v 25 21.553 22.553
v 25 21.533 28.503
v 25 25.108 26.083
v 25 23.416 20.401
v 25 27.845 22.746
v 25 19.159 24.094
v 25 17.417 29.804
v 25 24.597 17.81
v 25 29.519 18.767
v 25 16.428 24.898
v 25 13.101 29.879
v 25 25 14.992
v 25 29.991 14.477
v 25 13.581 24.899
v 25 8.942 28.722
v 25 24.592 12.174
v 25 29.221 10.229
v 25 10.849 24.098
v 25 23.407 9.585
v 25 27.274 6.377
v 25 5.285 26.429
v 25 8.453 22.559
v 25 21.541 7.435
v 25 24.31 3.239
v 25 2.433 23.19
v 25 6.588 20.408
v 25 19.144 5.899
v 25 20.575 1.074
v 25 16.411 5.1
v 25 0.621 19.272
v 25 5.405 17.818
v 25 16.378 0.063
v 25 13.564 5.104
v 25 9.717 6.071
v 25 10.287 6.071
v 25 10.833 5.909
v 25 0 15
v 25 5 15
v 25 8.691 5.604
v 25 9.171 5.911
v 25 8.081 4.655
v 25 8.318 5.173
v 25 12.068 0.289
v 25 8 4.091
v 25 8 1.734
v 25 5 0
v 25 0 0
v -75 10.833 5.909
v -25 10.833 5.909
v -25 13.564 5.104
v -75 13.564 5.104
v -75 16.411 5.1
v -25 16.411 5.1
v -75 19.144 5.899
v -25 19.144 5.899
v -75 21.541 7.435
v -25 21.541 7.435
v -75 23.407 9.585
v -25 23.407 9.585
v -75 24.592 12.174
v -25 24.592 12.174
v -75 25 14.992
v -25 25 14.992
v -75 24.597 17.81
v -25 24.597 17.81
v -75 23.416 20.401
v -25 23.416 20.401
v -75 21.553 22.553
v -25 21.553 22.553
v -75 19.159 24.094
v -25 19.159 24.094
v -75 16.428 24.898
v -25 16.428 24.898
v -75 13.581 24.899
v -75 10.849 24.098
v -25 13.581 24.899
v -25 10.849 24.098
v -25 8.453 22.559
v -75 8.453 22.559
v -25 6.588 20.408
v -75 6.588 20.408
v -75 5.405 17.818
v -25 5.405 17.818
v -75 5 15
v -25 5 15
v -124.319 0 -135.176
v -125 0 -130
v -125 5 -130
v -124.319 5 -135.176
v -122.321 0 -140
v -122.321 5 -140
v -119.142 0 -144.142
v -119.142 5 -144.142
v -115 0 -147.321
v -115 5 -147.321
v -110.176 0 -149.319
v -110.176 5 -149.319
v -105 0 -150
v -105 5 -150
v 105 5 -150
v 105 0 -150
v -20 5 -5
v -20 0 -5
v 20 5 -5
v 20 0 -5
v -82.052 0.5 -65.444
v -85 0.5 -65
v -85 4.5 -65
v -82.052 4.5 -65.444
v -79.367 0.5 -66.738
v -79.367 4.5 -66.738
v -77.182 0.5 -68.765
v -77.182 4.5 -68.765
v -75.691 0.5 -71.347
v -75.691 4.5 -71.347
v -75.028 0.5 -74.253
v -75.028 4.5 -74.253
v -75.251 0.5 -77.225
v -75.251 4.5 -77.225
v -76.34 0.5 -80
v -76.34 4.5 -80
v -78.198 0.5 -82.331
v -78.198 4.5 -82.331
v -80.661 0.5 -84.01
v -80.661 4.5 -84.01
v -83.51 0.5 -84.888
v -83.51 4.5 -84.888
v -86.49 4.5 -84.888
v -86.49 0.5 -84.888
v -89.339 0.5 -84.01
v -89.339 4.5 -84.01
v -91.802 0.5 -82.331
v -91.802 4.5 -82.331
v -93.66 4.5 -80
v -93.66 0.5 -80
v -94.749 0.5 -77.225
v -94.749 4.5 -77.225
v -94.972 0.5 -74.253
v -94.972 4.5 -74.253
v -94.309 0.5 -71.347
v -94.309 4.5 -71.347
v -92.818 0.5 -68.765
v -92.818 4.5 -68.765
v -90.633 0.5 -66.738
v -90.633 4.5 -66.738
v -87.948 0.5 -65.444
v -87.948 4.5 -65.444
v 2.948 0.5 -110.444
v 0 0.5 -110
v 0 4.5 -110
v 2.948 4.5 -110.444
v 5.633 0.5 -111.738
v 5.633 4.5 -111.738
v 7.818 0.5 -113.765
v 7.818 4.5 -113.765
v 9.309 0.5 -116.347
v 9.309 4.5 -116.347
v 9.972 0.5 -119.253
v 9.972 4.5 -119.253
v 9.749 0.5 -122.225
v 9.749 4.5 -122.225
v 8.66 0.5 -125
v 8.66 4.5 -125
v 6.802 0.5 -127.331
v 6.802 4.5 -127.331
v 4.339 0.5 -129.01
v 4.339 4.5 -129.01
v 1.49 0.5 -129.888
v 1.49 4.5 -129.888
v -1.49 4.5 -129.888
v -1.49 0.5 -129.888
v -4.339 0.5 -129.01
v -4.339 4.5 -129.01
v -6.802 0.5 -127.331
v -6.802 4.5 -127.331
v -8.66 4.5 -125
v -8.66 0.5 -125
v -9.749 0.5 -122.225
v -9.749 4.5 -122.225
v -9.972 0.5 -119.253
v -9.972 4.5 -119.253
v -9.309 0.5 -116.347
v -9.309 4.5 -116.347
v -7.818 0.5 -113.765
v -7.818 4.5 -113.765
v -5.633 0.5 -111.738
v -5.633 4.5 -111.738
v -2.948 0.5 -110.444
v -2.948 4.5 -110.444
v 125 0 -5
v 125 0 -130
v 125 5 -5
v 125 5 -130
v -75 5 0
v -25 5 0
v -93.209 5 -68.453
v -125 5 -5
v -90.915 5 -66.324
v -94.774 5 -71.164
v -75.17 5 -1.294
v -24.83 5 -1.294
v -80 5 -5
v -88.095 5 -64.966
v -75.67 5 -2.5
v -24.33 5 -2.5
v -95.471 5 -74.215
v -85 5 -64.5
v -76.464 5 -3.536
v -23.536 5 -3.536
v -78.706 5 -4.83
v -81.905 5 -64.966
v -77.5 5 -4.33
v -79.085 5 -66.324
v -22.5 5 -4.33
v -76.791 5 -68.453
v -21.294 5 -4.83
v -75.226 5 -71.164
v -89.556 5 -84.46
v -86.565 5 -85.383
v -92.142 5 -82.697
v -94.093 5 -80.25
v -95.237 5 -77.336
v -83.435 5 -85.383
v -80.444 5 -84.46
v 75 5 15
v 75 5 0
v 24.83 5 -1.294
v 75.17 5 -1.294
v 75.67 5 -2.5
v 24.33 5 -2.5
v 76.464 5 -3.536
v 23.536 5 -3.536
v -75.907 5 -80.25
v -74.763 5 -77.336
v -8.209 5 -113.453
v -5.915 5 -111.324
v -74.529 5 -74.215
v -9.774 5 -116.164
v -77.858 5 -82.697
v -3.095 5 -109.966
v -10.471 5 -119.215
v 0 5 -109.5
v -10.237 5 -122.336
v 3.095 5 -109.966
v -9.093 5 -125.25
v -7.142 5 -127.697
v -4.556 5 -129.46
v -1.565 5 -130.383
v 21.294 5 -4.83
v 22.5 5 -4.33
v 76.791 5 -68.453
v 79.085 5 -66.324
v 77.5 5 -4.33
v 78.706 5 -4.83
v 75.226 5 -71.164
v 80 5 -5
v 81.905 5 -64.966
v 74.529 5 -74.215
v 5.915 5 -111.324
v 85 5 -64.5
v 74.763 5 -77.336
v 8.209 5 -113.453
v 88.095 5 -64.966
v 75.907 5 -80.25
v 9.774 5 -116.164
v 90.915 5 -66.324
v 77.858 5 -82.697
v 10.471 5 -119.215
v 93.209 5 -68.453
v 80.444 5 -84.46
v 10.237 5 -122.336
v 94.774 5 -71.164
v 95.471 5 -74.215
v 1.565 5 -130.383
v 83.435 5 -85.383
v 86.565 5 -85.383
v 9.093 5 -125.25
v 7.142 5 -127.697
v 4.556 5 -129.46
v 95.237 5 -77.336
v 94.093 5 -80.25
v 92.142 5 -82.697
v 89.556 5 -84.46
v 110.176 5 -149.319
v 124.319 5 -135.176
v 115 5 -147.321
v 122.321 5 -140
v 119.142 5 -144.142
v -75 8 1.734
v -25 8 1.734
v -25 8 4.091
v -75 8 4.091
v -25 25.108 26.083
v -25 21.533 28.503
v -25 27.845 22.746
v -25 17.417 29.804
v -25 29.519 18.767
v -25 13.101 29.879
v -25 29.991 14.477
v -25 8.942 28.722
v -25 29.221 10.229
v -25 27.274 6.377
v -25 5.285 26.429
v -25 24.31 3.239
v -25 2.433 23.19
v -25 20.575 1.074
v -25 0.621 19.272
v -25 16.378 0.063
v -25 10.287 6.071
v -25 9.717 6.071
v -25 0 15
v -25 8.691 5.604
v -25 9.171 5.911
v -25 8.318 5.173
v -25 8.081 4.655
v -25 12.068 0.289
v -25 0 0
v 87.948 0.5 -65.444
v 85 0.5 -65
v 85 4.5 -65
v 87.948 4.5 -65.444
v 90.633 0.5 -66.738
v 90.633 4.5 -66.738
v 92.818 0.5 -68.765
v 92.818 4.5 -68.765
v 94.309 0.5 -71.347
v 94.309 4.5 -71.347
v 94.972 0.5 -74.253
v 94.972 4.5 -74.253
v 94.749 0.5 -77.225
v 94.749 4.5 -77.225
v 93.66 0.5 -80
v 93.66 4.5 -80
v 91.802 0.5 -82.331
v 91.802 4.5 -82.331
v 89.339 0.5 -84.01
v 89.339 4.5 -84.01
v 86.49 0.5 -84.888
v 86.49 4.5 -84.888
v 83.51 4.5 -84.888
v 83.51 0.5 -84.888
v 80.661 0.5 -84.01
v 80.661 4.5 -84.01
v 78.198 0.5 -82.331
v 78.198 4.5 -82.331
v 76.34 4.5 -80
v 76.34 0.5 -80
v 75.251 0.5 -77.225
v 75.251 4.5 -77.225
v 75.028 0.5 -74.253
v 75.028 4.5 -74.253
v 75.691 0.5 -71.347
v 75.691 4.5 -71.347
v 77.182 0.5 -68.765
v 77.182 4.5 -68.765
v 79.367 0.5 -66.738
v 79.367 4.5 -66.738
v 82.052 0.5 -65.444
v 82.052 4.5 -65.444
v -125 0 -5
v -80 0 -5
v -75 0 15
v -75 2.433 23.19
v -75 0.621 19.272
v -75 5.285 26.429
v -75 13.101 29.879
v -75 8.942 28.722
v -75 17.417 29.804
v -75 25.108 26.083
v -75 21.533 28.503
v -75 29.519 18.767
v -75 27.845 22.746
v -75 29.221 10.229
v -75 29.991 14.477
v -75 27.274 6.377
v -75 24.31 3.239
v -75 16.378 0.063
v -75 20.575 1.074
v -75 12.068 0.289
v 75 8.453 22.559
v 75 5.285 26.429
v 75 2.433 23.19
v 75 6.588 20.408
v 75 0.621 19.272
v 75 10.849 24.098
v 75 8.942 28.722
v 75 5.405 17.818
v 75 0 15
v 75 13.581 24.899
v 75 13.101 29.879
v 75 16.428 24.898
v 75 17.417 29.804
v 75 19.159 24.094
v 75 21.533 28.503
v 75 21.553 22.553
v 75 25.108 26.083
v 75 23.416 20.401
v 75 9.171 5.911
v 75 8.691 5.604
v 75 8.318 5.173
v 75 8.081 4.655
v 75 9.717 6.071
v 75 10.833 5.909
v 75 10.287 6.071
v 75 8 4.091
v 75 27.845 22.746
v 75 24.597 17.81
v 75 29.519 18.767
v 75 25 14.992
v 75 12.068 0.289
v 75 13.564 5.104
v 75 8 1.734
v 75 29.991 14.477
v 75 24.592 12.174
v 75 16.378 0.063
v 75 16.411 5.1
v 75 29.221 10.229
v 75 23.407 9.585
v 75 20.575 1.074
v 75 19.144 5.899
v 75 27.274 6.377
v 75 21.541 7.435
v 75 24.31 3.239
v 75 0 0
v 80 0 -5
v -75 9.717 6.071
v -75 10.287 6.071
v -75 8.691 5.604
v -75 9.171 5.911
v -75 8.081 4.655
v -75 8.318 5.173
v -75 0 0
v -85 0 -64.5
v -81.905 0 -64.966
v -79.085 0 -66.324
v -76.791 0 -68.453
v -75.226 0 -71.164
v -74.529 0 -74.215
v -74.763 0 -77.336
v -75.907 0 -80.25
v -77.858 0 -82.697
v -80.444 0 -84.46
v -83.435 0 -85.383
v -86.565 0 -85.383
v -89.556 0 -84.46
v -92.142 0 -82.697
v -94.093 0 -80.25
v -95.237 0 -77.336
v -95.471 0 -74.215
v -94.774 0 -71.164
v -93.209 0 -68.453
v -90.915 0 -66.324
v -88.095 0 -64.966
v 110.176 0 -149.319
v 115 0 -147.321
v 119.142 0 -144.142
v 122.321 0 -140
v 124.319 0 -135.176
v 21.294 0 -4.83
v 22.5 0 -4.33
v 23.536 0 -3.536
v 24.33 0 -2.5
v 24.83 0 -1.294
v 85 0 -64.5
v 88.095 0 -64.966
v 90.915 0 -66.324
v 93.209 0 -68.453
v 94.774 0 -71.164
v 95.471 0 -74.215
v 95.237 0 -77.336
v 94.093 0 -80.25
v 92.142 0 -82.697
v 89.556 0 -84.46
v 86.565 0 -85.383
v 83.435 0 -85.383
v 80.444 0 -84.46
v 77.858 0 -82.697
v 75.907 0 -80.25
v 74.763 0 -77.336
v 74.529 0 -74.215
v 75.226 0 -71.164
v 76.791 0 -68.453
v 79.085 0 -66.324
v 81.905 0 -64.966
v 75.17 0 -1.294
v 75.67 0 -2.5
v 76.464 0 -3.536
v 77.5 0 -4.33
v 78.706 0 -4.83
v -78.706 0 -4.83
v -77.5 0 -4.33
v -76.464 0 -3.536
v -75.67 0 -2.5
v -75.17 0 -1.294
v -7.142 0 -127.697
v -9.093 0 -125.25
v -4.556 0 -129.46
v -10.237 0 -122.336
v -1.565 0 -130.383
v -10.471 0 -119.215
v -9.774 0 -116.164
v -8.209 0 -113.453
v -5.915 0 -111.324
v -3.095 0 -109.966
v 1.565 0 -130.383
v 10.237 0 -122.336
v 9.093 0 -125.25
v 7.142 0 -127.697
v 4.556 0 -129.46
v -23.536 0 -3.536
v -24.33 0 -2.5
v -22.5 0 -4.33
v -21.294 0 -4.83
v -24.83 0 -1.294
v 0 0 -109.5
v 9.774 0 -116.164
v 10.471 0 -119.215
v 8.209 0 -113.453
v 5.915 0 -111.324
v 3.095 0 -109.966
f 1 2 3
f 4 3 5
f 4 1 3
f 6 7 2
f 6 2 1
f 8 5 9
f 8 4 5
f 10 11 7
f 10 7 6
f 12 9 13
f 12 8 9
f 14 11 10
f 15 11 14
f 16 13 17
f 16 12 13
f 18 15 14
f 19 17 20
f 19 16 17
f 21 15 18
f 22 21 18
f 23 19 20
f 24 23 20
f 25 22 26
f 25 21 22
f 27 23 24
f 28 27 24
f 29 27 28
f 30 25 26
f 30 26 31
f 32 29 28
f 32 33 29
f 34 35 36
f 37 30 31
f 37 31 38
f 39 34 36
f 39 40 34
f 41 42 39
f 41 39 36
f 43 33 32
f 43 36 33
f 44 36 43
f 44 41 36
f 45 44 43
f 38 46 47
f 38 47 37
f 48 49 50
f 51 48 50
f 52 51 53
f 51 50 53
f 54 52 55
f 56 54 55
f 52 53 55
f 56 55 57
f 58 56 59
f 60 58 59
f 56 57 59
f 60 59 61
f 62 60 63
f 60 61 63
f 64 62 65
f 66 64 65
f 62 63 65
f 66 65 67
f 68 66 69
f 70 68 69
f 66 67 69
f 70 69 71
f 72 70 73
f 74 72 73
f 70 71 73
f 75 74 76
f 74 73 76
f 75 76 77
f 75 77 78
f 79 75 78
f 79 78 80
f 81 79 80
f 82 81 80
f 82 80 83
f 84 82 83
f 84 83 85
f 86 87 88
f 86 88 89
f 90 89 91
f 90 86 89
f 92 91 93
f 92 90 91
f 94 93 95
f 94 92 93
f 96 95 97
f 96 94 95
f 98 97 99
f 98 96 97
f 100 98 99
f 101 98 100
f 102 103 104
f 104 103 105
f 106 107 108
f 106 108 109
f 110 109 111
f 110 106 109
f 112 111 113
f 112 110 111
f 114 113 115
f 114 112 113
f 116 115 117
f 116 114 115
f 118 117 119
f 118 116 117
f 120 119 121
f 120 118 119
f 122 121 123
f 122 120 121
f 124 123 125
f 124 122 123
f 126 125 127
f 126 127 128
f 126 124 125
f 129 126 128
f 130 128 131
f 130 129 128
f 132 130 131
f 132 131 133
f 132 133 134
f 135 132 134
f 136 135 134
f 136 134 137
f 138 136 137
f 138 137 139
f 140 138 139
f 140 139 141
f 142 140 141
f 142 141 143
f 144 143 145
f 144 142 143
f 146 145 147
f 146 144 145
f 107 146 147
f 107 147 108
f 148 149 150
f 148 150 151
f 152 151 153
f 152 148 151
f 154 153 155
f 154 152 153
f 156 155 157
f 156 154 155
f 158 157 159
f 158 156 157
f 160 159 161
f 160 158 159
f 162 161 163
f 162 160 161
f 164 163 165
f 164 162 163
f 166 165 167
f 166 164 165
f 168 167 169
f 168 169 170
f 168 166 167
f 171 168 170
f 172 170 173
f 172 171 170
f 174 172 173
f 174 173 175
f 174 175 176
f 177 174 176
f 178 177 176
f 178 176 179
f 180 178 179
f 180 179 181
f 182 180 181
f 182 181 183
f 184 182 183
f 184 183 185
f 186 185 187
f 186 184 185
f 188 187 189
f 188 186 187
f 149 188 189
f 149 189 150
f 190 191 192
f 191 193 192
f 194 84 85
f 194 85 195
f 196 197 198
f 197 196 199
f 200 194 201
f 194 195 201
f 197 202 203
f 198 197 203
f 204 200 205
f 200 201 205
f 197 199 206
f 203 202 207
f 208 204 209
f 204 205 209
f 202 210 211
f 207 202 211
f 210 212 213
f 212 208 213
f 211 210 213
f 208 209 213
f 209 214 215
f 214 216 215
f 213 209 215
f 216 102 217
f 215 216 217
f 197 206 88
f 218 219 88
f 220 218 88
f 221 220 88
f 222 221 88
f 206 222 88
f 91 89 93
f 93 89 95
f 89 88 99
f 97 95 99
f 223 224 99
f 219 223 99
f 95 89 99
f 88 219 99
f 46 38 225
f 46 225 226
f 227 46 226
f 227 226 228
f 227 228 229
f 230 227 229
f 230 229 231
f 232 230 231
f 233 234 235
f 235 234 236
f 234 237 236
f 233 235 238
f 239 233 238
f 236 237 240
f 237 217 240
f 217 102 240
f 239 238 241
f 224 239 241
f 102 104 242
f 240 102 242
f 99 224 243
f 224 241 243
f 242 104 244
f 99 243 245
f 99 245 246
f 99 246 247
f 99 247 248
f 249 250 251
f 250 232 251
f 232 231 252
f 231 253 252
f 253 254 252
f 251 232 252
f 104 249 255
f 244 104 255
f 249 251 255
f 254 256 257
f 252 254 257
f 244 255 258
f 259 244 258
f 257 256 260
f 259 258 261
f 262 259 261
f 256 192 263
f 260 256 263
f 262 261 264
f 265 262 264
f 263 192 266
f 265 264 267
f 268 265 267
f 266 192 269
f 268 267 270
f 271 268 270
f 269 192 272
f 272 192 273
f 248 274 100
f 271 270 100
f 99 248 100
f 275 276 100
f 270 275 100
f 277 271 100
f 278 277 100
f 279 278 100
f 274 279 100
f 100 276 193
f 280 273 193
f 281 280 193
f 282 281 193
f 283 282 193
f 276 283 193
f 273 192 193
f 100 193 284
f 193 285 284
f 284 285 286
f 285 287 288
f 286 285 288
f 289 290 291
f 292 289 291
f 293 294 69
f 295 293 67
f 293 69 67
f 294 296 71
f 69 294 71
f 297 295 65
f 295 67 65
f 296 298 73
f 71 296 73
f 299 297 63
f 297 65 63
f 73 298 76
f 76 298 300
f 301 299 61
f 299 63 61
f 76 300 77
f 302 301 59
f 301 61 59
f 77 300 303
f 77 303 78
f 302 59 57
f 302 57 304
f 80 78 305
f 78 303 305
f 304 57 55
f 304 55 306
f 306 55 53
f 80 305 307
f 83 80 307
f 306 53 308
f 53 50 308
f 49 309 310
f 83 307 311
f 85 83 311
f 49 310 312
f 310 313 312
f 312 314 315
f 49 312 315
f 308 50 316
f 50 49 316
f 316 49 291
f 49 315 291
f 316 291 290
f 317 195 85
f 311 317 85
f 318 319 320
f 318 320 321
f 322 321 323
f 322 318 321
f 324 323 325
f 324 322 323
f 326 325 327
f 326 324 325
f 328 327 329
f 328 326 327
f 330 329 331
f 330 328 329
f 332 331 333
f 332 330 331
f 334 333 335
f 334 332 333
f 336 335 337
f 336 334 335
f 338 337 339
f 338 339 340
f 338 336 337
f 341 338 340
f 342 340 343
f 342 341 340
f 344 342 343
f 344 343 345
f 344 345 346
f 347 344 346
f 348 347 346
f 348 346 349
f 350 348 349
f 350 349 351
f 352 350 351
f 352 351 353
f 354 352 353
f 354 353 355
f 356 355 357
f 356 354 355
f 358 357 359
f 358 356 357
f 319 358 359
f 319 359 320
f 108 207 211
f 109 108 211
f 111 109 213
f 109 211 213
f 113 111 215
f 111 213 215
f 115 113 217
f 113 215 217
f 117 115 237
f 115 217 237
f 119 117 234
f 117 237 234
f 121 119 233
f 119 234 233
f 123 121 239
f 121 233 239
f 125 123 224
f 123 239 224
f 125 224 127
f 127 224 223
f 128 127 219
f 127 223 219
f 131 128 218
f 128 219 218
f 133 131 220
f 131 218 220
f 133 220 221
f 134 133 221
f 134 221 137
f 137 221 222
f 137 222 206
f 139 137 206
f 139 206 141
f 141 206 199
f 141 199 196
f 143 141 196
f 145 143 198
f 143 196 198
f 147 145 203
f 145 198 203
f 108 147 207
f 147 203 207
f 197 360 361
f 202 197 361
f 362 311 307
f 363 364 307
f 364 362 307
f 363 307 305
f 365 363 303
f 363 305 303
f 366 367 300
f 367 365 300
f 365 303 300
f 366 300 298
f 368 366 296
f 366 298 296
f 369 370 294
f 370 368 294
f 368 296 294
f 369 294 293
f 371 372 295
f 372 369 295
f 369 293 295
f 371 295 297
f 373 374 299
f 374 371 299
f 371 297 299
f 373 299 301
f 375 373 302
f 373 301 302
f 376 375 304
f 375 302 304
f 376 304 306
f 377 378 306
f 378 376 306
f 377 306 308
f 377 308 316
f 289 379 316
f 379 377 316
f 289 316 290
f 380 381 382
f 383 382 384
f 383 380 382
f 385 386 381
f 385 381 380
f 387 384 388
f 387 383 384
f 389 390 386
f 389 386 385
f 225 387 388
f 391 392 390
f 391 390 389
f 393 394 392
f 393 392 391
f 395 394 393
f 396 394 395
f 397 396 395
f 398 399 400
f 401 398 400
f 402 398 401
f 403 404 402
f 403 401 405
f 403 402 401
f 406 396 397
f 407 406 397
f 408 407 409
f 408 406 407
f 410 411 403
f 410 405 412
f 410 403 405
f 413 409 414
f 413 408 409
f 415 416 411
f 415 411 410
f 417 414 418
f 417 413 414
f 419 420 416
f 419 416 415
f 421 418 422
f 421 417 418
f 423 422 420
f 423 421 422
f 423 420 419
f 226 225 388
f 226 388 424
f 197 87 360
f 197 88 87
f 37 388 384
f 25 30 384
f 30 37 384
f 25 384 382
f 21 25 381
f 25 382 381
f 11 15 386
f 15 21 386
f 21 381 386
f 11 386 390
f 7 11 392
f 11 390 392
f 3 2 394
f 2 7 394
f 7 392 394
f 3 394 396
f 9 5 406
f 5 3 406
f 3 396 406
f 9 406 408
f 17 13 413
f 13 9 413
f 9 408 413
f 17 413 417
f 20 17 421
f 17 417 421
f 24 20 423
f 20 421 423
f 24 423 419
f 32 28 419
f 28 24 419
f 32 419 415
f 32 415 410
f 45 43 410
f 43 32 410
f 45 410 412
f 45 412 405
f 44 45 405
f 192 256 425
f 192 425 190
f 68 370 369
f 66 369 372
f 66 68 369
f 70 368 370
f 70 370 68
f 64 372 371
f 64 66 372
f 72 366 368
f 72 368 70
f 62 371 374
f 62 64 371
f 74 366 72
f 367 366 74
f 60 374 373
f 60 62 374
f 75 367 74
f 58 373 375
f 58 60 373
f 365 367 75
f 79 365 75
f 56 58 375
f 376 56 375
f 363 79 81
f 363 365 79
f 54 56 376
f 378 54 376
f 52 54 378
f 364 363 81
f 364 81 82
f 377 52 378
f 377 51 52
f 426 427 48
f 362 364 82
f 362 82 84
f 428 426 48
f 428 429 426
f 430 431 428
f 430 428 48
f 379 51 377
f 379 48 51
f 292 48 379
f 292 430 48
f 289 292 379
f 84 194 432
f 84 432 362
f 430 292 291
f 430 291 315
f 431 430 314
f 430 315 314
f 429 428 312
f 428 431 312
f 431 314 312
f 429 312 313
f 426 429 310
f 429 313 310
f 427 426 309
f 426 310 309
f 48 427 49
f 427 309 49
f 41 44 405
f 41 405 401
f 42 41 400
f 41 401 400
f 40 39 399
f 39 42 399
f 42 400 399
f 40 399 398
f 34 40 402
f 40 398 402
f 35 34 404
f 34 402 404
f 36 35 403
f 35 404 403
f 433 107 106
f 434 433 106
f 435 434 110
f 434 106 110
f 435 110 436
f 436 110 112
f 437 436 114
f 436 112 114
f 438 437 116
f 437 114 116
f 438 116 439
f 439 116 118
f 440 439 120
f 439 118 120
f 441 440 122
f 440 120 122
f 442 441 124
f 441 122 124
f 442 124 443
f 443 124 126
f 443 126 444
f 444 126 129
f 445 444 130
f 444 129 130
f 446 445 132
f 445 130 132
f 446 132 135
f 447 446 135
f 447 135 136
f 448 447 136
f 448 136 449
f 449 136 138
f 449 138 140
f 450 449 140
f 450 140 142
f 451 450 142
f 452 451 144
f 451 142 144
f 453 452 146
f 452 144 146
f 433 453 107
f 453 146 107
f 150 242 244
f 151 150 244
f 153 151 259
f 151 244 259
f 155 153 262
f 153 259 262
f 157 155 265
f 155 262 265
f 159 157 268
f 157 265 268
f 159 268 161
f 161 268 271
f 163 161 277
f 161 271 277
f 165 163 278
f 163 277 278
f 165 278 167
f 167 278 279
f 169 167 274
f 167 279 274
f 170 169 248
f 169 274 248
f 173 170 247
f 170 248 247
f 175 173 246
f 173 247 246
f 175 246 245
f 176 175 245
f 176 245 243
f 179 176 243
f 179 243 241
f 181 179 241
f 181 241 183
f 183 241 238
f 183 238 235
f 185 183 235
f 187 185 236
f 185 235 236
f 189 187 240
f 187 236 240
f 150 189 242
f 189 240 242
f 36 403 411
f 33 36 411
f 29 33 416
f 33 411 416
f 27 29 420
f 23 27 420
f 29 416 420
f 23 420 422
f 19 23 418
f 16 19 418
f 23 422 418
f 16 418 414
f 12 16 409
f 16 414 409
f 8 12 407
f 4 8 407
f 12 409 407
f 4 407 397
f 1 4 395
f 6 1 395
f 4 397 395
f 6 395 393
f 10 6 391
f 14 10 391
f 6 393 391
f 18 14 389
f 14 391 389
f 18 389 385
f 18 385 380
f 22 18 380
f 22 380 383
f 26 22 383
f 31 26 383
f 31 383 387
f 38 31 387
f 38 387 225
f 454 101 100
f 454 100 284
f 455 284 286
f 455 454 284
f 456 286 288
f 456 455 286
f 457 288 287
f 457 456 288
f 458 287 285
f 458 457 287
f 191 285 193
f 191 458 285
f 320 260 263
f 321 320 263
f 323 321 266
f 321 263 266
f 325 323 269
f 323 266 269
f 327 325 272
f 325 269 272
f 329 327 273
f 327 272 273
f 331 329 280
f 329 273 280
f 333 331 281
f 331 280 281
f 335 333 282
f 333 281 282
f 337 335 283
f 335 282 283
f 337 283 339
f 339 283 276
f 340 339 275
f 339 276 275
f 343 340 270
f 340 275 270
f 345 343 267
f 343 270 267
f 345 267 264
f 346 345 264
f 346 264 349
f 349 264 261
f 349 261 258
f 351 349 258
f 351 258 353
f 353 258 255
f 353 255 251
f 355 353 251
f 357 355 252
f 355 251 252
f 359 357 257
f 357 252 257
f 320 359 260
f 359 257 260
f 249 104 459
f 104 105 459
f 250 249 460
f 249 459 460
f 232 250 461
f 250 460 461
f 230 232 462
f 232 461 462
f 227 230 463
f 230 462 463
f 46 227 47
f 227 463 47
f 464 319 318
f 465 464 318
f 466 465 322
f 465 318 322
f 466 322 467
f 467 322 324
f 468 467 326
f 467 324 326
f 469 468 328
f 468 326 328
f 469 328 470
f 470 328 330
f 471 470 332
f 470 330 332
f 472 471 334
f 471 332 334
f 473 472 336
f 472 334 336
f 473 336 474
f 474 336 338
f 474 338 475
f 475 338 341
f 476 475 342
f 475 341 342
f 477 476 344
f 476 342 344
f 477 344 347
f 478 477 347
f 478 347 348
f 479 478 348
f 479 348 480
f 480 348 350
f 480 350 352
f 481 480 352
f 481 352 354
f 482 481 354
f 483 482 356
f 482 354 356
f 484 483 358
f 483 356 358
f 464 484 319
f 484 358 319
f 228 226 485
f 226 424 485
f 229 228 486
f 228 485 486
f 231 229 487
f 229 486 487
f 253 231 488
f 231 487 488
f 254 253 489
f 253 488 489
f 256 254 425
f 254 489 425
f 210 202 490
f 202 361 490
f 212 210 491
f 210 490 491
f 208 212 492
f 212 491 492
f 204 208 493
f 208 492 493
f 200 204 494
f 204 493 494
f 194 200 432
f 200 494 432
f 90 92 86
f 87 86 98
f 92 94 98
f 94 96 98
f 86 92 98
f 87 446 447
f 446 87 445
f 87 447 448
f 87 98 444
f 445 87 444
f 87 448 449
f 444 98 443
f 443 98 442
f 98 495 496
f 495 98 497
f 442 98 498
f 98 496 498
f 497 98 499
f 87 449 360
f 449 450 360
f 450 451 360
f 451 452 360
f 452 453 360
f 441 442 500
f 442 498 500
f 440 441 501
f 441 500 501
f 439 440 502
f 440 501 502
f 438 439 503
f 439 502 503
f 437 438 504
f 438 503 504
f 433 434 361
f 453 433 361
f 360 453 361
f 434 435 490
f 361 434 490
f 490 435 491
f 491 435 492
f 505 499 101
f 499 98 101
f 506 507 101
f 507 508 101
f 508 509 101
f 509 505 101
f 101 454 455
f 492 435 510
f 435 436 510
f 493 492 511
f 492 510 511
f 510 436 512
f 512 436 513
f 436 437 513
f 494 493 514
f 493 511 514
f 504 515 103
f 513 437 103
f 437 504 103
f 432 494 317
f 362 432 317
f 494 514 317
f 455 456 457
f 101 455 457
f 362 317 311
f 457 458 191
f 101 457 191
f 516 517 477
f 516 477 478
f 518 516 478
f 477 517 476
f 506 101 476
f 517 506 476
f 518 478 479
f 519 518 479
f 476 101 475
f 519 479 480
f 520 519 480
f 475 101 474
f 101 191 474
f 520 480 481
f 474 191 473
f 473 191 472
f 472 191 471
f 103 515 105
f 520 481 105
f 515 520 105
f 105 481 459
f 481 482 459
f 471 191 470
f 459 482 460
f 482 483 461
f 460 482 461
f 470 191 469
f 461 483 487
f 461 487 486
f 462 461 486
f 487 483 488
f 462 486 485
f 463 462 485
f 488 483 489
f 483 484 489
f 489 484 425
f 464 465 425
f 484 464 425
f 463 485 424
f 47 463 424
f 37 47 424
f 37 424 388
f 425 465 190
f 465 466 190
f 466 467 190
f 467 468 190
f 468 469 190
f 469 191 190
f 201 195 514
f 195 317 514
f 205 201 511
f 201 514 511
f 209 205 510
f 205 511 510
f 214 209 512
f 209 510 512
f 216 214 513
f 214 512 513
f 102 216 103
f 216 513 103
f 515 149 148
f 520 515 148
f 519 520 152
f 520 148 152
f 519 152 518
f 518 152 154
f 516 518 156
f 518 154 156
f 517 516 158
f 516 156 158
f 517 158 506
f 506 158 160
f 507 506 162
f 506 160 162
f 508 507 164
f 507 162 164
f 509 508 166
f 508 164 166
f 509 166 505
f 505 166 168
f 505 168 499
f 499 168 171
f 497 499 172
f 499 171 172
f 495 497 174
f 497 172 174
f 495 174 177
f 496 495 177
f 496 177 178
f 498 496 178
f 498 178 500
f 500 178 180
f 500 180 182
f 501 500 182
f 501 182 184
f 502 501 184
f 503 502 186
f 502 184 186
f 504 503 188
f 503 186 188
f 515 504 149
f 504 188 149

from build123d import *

# Parameters (mm, degrees)
SKETCH1_R           = 10
BOSS_EXTRUDE1_DEPTH = 5
BOSS_EXTRUDE2_DEPTH = 125
SKETCH3_W           = 50
SKETCH3_H           = 35
CUT_EXTRUDE1_DEPTH  = 30
FILLET1_R           = 5
CHAMFER1_SIZE       = 0.5


with BuildPart() as part:
    # Sketch1 → Boss-Extrude1 (new body)
    with BuildSketch(Plane(origin=(0, 0, 0), x_dir=(1, 0, 0), z_dir=(0, 1, 0))):
        with BuildLine():
            Line((-105, 150), (105, 150))
            ThreePointArc((105, 150), (119.142135624, 144.142135624), (125, 130))
            Line((125, 130), (125, 0))
            Line((125, 0), (-125, 0))
            Line((-125, 0), (-125, 130))
            ThreePointArc((-125, 130), (-119.142135624, 144.142135624), (-105, 150))
        make_face()
        with Locations(Location((-85, 75, 0), (0, 0, 270))):
            Circle(SKETCH1_R, mode=Mode.SUBTRACT)
        with Locations(Location((85, 75, 0), (0, 0, 270))):
            Circle(SKETCH1_R, mode=Mode.SUBTRACT)
        with Locations(Location((0, 120, 0), (0, 0, 270))):
            Circle(SKETCH1_R, mode=Mode.SUBTRACT)
    extrude(amount=BOSS_EXTRUDE1_DEPTH)

    # Sketch2 → Boss-Extrude2 (add, symmetric)
    with BuildSketch(Plane(origin=(0, 0, 0), x_dir=(0, 0, -1), z_dir=(1, 0, 0))):
        with BuildLine():
            Line((0, 0), (-15, 0))
            ThreePointArc((-15, 0), (-22.745966692, 27.845232579), (-1.733500839, 8))
            Line((-1.733500839, 8), (-4.091287885, 8))
            ThreePointArc((-4.091287885, 8), (-5.774538708, 8.91987655), (-5.909406571, 10.833333333))
            ThreePointArc((-5.909406571, 10.833333333), (-20.400617249, 23.416254115), (-15, 5))
            Line((-15, 5), (0, 5))
            Line((0, 5), (0, 0))
        make_face()
    extrude(amount=BOSS_EXTRUDE2_DEPTH, both=True)

    # Sketch3 → Cut-Extrude1 (cut, symmetric)
    with BuildSketch(Plane(origin=(0, 0, 0), x_dir=(1, 0, 0), z_dir=(0, 1, 0))):
        with Locations((-100, -12.5)):
            Rectangle(SKETCH3_W, SKETCH3_H)
        with Locations((0, -12.5)):
            Rectangle(SKETCH3_W, SKETCH3_H)
        with Locations((100, -12.5)):
            Rectangle(SKETCH3_W, SKETCH3_H)
    extrude(amount=CUT_EXTRUDE1_DEPTH, both=True, mode=Mode.SUBTRACT)

    # Fillet1
    fillet1_edges = [part.edges().sort_by_distance(p)[0] for p in [
        (75, 2.5, -5),
        (-75, 2.5, -5),
        (25, 2.5, -5),
        (-25, 2.5, -5),
    ]]
    fillet(fillet1_edges, radius=FILLET1_R)

    # Chamfer1
    chamfer1_edges = [part.edges().sort_by_distance(p)[0] for p in [
        (-85, 0, -85),
        (-85, 5, -85),
        (85, 0, -85),
        (85, 5, -85),
        (0, 0, -130),
        (0, 5, -130),
    ]]
    chamfer(chamfer1_edges, length=CHAMFER1_SIZE)


solid = part.part
